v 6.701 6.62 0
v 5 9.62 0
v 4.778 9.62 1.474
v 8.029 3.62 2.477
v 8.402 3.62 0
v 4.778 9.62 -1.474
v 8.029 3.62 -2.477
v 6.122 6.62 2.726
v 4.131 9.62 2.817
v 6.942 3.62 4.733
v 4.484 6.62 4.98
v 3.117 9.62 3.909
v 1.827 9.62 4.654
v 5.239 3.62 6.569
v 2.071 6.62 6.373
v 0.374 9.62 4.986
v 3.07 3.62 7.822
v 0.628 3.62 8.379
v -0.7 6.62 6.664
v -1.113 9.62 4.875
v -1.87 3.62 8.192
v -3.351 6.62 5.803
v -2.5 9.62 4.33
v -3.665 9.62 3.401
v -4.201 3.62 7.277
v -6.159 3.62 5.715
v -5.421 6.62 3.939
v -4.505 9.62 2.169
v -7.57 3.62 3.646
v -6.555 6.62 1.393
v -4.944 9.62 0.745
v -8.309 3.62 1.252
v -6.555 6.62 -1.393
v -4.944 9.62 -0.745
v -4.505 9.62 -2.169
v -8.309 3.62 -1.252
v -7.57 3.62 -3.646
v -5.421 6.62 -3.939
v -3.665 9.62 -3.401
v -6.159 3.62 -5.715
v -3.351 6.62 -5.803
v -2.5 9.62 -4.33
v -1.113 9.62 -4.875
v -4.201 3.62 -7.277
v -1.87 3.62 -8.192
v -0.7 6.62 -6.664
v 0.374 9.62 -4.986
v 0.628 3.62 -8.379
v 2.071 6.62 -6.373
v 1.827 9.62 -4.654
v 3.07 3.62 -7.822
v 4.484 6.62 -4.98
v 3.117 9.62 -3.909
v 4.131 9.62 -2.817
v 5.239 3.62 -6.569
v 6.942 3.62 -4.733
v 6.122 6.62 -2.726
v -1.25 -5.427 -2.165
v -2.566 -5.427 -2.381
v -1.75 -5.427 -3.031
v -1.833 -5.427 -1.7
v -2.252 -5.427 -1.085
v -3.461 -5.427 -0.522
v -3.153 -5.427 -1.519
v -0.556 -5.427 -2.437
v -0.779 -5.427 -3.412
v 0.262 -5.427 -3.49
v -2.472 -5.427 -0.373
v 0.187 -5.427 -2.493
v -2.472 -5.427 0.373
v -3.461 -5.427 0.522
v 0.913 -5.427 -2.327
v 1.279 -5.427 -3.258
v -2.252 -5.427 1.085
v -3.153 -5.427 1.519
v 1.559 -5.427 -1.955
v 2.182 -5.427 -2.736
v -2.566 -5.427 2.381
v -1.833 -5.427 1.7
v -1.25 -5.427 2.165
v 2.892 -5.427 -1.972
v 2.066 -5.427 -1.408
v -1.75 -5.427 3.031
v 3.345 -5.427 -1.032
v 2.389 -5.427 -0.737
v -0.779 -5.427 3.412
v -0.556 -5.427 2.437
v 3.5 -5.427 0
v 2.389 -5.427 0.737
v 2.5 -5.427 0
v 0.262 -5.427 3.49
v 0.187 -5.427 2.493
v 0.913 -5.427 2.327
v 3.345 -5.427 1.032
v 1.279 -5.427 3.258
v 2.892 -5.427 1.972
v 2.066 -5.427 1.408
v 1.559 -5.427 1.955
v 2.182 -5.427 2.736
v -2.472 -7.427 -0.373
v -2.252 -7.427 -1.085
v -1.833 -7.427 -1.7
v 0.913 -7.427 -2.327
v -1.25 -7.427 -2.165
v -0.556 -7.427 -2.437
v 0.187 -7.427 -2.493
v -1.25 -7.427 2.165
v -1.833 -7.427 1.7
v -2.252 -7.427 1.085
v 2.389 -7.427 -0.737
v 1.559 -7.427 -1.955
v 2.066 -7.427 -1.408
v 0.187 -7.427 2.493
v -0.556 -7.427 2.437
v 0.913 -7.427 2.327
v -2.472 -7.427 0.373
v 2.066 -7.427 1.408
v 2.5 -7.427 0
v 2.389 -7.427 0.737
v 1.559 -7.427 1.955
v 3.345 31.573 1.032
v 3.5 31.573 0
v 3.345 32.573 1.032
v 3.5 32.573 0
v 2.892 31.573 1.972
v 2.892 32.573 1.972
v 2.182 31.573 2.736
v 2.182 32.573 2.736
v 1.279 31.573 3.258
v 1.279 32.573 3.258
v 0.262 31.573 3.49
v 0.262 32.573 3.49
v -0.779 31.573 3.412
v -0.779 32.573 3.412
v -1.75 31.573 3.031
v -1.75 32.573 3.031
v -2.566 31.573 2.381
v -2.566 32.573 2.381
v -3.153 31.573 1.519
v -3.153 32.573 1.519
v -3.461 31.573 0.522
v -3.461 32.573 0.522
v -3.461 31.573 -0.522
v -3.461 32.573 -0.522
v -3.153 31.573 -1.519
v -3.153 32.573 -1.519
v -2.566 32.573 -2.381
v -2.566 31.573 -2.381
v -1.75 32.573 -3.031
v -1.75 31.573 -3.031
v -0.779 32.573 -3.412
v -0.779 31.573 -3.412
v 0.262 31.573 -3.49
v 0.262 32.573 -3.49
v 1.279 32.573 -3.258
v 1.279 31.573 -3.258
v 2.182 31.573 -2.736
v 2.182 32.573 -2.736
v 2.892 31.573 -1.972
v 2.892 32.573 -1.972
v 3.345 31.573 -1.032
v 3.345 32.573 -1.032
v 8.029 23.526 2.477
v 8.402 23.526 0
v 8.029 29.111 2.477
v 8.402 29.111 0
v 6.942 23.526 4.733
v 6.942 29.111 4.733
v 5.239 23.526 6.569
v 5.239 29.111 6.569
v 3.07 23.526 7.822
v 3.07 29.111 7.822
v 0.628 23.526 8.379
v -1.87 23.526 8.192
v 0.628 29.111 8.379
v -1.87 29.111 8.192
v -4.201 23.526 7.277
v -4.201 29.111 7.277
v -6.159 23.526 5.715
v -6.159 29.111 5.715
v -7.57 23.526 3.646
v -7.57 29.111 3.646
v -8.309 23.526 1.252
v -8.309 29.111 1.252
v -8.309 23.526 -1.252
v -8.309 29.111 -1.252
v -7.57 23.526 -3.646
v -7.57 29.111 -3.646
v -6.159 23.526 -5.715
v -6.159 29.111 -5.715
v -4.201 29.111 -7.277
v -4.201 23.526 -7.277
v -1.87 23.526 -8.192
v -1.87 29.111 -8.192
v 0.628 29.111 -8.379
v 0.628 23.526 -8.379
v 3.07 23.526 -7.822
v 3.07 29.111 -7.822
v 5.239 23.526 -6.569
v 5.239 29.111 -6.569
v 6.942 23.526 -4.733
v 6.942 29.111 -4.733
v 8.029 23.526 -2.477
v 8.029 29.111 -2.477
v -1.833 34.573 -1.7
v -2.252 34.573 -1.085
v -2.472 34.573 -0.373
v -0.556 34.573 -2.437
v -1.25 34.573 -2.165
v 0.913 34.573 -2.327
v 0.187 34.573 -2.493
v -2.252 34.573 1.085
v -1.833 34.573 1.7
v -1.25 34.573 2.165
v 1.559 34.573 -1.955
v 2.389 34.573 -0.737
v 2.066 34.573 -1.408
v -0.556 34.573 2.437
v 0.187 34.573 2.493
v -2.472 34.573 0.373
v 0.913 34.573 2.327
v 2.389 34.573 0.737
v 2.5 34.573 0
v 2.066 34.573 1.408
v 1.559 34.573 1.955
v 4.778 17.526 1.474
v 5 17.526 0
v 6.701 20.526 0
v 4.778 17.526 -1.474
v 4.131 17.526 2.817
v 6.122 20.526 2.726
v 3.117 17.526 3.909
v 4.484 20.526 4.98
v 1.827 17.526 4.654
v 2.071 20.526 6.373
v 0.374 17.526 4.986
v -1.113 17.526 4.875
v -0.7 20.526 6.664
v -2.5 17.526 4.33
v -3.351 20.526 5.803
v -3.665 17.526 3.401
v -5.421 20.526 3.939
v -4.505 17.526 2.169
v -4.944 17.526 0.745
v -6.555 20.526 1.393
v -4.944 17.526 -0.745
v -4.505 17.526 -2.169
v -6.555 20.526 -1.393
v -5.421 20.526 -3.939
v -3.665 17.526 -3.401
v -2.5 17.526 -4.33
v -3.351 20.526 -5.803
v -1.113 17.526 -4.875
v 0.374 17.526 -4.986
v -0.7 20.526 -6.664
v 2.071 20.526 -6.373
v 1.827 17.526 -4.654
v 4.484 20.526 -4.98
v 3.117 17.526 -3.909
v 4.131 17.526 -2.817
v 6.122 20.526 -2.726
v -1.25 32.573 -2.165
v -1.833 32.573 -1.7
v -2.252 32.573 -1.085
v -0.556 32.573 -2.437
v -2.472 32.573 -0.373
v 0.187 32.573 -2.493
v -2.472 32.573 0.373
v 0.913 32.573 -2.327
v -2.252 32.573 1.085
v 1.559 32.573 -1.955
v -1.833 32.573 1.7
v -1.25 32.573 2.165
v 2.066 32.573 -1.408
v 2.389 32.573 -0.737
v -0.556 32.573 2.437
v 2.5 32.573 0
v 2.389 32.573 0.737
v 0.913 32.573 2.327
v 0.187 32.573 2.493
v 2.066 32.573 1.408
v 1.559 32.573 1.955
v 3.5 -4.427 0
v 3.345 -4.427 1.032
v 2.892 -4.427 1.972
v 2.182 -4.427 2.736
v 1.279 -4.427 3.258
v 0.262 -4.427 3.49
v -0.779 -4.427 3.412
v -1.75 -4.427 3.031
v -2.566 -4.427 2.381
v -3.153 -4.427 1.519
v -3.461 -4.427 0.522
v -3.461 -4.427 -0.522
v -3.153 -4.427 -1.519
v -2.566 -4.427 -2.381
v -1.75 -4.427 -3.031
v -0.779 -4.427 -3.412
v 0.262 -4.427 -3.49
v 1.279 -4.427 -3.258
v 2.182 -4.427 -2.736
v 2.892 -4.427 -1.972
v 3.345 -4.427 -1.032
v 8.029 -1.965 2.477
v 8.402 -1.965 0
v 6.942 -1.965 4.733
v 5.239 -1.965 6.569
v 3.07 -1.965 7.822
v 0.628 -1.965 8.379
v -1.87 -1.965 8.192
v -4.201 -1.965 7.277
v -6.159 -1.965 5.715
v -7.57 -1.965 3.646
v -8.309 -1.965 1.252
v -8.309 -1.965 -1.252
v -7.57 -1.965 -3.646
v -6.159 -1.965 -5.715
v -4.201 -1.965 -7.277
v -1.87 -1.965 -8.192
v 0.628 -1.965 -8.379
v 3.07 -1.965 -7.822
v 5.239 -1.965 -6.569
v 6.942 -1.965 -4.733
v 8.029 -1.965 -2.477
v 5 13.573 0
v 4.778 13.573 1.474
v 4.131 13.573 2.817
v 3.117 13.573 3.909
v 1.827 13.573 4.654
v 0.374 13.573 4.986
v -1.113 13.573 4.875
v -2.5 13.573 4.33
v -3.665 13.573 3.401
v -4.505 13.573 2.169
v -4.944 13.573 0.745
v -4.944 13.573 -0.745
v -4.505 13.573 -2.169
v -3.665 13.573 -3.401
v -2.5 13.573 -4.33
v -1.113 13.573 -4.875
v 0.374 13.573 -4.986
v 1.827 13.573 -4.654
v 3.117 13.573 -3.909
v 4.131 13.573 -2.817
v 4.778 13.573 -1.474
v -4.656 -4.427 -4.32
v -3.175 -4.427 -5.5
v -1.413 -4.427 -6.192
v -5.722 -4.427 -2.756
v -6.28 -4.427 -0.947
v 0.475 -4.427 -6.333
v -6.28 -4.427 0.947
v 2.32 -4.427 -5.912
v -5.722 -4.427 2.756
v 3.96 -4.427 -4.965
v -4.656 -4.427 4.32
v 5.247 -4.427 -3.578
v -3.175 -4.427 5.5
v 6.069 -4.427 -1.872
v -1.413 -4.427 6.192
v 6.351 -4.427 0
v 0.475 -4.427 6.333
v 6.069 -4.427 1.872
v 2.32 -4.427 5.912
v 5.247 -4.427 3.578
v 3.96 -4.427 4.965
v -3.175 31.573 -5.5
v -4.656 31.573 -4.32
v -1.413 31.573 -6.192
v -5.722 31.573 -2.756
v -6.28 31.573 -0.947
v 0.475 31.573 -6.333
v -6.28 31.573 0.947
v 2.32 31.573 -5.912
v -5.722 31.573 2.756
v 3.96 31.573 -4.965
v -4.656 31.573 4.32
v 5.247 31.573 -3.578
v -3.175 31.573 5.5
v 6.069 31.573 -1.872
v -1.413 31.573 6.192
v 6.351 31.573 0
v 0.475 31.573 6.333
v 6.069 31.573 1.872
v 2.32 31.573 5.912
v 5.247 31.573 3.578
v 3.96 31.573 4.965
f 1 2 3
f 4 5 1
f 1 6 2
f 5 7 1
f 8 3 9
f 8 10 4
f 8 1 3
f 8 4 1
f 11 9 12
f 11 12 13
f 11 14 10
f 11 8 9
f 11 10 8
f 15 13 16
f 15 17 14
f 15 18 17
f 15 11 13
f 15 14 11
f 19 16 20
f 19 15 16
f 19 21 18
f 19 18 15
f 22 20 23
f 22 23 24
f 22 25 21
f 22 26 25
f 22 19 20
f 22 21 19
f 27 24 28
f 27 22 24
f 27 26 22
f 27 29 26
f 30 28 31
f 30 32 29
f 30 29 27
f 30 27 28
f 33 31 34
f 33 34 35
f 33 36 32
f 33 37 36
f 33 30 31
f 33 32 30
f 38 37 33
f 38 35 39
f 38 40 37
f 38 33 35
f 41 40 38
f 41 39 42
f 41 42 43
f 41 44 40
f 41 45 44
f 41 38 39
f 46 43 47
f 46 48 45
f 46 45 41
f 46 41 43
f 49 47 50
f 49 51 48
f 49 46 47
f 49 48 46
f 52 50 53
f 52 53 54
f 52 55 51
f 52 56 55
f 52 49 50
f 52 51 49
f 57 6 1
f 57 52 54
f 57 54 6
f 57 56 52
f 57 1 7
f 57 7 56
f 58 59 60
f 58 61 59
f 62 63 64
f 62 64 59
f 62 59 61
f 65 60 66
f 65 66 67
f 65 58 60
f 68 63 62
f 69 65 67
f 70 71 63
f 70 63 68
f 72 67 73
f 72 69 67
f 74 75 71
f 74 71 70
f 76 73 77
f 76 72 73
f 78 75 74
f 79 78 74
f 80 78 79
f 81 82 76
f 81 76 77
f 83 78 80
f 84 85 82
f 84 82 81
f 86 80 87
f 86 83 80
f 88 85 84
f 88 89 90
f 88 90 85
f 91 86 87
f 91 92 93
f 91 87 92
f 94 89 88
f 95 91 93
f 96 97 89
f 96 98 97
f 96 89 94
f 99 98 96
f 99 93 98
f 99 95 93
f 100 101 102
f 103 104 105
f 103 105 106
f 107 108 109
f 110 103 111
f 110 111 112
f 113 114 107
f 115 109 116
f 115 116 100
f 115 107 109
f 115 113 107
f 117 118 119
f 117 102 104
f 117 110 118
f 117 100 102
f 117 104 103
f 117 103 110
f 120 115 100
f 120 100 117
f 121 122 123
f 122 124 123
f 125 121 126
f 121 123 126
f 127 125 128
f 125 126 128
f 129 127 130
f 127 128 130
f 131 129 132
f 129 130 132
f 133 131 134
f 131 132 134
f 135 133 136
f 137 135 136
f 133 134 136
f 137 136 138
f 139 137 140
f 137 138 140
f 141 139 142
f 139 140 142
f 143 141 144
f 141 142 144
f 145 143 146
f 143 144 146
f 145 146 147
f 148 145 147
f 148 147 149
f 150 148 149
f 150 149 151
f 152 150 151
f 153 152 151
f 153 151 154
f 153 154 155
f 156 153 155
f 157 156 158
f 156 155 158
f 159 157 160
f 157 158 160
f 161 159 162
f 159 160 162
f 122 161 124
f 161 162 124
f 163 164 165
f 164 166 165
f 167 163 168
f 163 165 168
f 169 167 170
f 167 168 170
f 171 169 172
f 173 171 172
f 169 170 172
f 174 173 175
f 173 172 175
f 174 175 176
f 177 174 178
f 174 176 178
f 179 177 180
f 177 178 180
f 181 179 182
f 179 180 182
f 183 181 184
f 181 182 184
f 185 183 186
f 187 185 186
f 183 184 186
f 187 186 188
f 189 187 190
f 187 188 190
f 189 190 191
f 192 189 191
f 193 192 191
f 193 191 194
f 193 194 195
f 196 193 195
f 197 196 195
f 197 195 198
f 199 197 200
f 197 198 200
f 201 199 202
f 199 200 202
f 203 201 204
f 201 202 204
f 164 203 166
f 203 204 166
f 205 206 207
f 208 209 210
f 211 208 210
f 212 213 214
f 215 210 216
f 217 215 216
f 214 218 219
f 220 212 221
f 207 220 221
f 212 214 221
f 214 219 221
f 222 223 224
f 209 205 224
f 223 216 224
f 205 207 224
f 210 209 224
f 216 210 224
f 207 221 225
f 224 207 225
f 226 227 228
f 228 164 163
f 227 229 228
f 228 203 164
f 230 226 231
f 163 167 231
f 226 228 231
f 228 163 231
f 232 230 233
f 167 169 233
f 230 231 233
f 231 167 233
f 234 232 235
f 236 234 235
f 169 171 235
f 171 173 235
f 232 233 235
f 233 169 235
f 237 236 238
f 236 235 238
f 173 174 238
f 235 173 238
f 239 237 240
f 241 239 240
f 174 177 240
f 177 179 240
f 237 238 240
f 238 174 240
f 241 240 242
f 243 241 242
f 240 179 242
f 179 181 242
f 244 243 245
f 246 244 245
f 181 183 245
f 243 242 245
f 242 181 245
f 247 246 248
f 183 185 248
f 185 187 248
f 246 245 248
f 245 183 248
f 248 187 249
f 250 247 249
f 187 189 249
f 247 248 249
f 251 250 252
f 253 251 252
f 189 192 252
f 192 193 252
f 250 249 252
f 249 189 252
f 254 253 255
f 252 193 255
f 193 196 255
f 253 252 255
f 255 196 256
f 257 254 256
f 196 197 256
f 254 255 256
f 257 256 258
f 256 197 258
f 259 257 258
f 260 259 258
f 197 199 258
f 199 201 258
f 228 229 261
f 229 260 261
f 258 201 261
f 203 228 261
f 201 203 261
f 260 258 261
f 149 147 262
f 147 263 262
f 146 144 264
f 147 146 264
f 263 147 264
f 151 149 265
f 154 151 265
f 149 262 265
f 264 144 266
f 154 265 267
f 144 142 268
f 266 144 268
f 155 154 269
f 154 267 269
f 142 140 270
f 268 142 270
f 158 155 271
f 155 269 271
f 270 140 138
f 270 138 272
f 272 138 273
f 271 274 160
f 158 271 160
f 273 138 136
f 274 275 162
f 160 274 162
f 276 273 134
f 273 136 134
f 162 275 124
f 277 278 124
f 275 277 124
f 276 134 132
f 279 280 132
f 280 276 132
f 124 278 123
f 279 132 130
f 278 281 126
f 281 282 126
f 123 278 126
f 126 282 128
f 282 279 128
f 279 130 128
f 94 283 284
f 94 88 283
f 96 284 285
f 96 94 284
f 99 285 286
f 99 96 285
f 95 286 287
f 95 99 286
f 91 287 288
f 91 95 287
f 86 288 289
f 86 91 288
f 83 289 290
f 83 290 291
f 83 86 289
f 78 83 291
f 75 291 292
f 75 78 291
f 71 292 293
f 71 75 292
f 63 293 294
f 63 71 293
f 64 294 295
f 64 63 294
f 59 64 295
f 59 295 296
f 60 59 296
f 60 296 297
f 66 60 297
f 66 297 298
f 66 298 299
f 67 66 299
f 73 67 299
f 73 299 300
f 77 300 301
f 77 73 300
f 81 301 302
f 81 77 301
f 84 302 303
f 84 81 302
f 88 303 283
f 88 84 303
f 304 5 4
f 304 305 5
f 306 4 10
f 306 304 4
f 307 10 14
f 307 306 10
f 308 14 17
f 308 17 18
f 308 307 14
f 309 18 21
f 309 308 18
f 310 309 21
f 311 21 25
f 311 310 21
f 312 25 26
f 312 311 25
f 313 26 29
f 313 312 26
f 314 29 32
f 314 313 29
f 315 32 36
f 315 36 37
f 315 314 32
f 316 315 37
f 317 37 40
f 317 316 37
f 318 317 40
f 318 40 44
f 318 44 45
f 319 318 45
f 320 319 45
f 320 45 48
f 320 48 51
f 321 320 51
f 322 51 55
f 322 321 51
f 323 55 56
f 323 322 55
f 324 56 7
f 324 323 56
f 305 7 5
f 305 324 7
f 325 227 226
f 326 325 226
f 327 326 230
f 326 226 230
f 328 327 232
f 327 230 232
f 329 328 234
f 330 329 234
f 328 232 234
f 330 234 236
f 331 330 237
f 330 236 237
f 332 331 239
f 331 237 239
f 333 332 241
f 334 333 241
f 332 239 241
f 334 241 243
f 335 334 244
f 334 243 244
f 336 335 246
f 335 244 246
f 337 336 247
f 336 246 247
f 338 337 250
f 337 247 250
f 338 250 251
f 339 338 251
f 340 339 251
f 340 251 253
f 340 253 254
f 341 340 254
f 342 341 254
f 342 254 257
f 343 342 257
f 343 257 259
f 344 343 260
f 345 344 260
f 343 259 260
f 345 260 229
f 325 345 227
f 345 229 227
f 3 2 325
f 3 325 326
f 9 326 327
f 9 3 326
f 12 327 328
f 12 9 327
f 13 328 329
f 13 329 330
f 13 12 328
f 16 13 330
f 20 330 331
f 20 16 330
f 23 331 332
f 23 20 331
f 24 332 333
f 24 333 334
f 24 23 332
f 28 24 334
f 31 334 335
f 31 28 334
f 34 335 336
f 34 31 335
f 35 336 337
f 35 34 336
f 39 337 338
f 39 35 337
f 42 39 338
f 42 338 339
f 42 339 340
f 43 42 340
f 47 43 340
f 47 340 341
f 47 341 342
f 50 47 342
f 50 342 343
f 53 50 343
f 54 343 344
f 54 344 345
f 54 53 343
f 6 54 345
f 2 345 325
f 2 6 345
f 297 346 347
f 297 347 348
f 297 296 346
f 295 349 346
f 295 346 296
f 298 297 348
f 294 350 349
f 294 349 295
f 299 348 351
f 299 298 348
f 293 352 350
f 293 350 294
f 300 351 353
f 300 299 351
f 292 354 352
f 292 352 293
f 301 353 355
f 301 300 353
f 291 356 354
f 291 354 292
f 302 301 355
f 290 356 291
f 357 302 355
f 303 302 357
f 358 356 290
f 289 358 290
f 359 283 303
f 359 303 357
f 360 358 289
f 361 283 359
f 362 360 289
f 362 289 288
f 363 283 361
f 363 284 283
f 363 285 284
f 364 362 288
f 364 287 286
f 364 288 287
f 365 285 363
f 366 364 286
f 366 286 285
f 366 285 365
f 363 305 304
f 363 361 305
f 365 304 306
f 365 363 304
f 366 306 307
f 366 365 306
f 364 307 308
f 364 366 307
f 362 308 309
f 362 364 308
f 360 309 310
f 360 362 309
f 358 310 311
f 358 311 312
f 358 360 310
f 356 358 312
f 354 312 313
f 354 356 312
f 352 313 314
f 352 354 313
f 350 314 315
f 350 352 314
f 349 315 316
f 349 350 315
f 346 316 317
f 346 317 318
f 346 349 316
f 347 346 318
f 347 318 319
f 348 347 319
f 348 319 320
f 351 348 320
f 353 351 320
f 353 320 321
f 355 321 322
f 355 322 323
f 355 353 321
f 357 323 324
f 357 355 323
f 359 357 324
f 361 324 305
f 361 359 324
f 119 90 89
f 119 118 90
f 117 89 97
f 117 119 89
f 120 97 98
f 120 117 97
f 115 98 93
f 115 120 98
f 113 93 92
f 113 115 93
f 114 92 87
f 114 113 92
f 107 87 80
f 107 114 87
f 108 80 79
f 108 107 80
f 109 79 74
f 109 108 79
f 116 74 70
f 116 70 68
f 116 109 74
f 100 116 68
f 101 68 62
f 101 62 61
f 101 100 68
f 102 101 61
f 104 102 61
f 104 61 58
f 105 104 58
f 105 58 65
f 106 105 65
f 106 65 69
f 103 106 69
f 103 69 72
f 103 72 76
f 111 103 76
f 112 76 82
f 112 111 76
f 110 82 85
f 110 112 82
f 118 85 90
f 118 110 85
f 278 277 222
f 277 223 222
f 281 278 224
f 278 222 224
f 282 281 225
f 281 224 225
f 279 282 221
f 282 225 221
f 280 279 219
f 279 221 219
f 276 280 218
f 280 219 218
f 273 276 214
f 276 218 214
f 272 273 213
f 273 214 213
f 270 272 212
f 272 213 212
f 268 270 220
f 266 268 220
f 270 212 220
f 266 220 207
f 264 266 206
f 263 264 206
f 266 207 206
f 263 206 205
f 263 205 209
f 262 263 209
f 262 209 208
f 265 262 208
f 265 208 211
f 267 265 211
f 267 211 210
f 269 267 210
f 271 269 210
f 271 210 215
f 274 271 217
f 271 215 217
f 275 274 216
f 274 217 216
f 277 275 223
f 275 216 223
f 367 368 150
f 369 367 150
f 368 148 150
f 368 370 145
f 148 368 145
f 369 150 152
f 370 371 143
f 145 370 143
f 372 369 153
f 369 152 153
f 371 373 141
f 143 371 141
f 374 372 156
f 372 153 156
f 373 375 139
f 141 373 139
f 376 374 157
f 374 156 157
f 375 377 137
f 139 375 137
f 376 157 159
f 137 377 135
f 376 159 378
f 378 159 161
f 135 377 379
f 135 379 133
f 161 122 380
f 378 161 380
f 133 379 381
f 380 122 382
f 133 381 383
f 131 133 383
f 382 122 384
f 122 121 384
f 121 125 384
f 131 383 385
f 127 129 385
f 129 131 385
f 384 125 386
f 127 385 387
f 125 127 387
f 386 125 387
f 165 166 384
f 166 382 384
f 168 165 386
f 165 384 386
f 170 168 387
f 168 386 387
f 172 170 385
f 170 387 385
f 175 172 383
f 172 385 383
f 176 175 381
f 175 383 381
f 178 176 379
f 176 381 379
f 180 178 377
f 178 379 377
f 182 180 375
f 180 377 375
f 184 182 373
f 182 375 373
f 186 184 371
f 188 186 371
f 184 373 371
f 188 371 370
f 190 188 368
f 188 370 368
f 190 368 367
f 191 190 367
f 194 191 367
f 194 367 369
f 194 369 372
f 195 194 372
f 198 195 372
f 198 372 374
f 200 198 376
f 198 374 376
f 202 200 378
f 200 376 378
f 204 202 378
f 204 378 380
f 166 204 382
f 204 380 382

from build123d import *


with BuildPart() as part:
    # Sketch1 → Revolve1 (revolve)
    with BuildSketch(Plane.XY):
        Polygon((0, 34.572999671), (0, 13.572999671), (5, 13.572999671), (5, 17.52594584), (8.402394853, 23.52594584), (8.402394853, 29.111258282), (6.350943696, 31.572999671), (3.5, 31.572999671), (3.5, 32.572999671), (2.5, 32.572999671), (2.5, 34.572999671), align=None)
    revolve1 = revolve(axis=Axis((0, 34.572999671, 0), (0, -1, 0)))

    # Mirror1: Revolve1 across plane
    add(revolve1.mirror(Plane.ZX.offset(13.572999671)))


solid = part.part
